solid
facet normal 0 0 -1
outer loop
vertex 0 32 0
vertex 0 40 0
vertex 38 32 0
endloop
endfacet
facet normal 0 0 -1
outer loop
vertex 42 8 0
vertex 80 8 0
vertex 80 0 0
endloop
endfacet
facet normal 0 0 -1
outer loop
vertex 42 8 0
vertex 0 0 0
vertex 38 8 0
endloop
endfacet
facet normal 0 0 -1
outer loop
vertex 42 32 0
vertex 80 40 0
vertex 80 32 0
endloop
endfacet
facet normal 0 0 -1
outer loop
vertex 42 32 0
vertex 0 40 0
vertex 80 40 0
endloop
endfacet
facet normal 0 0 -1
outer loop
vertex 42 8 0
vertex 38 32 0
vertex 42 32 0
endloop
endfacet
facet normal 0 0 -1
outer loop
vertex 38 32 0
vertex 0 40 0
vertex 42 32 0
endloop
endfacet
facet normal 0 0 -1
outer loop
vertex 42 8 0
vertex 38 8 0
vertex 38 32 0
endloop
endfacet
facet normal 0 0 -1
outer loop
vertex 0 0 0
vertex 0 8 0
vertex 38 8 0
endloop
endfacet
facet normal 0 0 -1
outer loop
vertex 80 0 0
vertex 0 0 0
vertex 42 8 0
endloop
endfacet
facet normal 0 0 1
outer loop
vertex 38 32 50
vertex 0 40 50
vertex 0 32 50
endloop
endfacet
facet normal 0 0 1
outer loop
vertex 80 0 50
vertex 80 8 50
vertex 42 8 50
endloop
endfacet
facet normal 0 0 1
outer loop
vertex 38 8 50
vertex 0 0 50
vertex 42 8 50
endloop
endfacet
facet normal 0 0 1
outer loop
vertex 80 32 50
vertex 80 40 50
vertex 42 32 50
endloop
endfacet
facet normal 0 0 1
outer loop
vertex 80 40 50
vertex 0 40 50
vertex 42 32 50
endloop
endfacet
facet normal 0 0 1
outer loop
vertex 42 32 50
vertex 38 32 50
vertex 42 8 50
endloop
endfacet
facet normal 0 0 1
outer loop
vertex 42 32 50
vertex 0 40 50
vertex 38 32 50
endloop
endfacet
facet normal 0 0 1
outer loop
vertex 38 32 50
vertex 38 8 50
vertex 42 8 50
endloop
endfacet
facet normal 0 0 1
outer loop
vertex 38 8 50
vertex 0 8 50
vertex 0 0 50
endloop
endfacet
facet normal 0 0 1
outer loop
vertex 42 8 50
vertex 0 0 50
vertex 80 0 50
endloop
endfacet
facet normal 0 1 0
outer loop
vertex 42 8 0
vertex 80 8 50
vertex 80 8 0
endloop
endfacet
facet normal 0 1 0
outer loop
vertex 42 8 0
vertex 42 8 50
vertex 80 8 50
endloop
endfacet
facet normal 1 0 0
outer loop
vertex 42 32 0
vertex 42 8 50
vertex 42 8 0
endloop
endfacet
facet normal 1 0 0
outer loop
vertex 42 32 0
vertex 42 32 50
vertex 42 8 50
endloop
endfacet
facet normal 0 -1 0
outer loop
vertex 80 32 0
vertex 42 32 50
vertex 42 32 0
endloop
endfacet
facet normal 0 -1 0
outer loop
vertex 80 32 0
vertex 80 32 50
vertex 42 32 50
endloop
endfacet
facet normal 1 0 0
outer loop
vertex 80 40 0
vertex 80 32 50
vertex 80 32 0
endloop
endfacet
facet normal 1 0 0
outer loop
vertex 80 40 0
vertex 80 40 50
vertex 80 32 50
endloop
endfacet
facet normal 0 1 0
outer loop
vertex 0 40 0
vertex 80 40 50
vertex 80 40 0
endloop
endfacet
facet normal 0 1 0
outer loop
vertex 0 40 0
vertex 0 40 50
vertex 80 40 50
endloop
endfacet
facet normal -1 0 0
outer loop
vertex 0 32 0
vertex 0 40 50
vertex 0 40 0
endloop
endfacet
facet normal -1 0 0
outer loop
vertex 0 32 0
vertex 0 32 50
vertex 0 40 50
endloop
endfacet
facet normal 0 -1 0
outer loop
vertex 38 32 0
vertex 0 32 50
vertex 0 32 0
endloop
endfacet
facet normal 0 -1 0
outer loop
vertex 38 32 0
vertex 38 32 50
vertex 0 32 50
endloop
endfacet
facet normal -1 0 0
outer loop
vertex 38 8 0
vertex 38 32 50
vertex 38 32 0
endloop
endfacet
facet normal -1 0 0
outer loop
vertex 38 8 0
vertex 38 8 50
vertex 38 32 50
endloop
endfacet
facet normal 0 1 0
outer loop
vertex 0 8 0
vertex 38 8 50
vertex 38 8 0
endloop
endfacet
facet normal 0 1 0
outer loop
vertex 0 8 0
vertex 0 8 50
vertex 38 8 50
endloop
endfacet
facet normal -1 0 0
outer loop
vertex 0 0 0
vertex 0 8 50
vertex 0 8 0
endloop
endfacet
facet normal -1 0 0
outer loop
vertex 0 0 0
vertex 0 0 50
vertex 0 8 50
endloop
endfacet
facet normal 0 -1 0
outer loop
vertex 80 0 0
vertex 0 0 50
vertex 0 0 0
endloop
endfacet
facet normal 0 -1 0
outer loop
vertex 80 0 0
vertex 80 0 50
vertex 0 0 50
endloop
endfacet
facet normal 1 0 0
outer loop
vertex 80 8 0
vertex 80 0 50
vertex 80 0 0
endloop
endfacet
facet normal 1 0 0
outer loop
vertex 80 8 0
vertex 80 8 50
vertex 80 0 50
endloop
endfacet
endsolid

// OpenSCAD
$fn = 32;

// ----------------------------------------------------------------------
// Structural section: ibeam 80 x 40 mm
// ----------------------------------------------------------------------

// --- parameters (mm) ---
sec_w = 80;               // section width, X
sec_h = 40;               // section height, Y
flange_t = 8;             // flange thickness
web_t = 4;                // web thickness
plate_t = 50;             // cut length, Z (extrusion height)

profile = [[0, 0], [80, 0], [80, 8], [42, 8], [42, 32], [80, 32], [80, 40], [0, 40], [0, 32], [38, 32], [38, 8], [0, 8]];  // primary outline, 12 points, counter clockwise

// --- the one profile operation ---
linear_extrude(height = plate_t) polygon(points = profile);
